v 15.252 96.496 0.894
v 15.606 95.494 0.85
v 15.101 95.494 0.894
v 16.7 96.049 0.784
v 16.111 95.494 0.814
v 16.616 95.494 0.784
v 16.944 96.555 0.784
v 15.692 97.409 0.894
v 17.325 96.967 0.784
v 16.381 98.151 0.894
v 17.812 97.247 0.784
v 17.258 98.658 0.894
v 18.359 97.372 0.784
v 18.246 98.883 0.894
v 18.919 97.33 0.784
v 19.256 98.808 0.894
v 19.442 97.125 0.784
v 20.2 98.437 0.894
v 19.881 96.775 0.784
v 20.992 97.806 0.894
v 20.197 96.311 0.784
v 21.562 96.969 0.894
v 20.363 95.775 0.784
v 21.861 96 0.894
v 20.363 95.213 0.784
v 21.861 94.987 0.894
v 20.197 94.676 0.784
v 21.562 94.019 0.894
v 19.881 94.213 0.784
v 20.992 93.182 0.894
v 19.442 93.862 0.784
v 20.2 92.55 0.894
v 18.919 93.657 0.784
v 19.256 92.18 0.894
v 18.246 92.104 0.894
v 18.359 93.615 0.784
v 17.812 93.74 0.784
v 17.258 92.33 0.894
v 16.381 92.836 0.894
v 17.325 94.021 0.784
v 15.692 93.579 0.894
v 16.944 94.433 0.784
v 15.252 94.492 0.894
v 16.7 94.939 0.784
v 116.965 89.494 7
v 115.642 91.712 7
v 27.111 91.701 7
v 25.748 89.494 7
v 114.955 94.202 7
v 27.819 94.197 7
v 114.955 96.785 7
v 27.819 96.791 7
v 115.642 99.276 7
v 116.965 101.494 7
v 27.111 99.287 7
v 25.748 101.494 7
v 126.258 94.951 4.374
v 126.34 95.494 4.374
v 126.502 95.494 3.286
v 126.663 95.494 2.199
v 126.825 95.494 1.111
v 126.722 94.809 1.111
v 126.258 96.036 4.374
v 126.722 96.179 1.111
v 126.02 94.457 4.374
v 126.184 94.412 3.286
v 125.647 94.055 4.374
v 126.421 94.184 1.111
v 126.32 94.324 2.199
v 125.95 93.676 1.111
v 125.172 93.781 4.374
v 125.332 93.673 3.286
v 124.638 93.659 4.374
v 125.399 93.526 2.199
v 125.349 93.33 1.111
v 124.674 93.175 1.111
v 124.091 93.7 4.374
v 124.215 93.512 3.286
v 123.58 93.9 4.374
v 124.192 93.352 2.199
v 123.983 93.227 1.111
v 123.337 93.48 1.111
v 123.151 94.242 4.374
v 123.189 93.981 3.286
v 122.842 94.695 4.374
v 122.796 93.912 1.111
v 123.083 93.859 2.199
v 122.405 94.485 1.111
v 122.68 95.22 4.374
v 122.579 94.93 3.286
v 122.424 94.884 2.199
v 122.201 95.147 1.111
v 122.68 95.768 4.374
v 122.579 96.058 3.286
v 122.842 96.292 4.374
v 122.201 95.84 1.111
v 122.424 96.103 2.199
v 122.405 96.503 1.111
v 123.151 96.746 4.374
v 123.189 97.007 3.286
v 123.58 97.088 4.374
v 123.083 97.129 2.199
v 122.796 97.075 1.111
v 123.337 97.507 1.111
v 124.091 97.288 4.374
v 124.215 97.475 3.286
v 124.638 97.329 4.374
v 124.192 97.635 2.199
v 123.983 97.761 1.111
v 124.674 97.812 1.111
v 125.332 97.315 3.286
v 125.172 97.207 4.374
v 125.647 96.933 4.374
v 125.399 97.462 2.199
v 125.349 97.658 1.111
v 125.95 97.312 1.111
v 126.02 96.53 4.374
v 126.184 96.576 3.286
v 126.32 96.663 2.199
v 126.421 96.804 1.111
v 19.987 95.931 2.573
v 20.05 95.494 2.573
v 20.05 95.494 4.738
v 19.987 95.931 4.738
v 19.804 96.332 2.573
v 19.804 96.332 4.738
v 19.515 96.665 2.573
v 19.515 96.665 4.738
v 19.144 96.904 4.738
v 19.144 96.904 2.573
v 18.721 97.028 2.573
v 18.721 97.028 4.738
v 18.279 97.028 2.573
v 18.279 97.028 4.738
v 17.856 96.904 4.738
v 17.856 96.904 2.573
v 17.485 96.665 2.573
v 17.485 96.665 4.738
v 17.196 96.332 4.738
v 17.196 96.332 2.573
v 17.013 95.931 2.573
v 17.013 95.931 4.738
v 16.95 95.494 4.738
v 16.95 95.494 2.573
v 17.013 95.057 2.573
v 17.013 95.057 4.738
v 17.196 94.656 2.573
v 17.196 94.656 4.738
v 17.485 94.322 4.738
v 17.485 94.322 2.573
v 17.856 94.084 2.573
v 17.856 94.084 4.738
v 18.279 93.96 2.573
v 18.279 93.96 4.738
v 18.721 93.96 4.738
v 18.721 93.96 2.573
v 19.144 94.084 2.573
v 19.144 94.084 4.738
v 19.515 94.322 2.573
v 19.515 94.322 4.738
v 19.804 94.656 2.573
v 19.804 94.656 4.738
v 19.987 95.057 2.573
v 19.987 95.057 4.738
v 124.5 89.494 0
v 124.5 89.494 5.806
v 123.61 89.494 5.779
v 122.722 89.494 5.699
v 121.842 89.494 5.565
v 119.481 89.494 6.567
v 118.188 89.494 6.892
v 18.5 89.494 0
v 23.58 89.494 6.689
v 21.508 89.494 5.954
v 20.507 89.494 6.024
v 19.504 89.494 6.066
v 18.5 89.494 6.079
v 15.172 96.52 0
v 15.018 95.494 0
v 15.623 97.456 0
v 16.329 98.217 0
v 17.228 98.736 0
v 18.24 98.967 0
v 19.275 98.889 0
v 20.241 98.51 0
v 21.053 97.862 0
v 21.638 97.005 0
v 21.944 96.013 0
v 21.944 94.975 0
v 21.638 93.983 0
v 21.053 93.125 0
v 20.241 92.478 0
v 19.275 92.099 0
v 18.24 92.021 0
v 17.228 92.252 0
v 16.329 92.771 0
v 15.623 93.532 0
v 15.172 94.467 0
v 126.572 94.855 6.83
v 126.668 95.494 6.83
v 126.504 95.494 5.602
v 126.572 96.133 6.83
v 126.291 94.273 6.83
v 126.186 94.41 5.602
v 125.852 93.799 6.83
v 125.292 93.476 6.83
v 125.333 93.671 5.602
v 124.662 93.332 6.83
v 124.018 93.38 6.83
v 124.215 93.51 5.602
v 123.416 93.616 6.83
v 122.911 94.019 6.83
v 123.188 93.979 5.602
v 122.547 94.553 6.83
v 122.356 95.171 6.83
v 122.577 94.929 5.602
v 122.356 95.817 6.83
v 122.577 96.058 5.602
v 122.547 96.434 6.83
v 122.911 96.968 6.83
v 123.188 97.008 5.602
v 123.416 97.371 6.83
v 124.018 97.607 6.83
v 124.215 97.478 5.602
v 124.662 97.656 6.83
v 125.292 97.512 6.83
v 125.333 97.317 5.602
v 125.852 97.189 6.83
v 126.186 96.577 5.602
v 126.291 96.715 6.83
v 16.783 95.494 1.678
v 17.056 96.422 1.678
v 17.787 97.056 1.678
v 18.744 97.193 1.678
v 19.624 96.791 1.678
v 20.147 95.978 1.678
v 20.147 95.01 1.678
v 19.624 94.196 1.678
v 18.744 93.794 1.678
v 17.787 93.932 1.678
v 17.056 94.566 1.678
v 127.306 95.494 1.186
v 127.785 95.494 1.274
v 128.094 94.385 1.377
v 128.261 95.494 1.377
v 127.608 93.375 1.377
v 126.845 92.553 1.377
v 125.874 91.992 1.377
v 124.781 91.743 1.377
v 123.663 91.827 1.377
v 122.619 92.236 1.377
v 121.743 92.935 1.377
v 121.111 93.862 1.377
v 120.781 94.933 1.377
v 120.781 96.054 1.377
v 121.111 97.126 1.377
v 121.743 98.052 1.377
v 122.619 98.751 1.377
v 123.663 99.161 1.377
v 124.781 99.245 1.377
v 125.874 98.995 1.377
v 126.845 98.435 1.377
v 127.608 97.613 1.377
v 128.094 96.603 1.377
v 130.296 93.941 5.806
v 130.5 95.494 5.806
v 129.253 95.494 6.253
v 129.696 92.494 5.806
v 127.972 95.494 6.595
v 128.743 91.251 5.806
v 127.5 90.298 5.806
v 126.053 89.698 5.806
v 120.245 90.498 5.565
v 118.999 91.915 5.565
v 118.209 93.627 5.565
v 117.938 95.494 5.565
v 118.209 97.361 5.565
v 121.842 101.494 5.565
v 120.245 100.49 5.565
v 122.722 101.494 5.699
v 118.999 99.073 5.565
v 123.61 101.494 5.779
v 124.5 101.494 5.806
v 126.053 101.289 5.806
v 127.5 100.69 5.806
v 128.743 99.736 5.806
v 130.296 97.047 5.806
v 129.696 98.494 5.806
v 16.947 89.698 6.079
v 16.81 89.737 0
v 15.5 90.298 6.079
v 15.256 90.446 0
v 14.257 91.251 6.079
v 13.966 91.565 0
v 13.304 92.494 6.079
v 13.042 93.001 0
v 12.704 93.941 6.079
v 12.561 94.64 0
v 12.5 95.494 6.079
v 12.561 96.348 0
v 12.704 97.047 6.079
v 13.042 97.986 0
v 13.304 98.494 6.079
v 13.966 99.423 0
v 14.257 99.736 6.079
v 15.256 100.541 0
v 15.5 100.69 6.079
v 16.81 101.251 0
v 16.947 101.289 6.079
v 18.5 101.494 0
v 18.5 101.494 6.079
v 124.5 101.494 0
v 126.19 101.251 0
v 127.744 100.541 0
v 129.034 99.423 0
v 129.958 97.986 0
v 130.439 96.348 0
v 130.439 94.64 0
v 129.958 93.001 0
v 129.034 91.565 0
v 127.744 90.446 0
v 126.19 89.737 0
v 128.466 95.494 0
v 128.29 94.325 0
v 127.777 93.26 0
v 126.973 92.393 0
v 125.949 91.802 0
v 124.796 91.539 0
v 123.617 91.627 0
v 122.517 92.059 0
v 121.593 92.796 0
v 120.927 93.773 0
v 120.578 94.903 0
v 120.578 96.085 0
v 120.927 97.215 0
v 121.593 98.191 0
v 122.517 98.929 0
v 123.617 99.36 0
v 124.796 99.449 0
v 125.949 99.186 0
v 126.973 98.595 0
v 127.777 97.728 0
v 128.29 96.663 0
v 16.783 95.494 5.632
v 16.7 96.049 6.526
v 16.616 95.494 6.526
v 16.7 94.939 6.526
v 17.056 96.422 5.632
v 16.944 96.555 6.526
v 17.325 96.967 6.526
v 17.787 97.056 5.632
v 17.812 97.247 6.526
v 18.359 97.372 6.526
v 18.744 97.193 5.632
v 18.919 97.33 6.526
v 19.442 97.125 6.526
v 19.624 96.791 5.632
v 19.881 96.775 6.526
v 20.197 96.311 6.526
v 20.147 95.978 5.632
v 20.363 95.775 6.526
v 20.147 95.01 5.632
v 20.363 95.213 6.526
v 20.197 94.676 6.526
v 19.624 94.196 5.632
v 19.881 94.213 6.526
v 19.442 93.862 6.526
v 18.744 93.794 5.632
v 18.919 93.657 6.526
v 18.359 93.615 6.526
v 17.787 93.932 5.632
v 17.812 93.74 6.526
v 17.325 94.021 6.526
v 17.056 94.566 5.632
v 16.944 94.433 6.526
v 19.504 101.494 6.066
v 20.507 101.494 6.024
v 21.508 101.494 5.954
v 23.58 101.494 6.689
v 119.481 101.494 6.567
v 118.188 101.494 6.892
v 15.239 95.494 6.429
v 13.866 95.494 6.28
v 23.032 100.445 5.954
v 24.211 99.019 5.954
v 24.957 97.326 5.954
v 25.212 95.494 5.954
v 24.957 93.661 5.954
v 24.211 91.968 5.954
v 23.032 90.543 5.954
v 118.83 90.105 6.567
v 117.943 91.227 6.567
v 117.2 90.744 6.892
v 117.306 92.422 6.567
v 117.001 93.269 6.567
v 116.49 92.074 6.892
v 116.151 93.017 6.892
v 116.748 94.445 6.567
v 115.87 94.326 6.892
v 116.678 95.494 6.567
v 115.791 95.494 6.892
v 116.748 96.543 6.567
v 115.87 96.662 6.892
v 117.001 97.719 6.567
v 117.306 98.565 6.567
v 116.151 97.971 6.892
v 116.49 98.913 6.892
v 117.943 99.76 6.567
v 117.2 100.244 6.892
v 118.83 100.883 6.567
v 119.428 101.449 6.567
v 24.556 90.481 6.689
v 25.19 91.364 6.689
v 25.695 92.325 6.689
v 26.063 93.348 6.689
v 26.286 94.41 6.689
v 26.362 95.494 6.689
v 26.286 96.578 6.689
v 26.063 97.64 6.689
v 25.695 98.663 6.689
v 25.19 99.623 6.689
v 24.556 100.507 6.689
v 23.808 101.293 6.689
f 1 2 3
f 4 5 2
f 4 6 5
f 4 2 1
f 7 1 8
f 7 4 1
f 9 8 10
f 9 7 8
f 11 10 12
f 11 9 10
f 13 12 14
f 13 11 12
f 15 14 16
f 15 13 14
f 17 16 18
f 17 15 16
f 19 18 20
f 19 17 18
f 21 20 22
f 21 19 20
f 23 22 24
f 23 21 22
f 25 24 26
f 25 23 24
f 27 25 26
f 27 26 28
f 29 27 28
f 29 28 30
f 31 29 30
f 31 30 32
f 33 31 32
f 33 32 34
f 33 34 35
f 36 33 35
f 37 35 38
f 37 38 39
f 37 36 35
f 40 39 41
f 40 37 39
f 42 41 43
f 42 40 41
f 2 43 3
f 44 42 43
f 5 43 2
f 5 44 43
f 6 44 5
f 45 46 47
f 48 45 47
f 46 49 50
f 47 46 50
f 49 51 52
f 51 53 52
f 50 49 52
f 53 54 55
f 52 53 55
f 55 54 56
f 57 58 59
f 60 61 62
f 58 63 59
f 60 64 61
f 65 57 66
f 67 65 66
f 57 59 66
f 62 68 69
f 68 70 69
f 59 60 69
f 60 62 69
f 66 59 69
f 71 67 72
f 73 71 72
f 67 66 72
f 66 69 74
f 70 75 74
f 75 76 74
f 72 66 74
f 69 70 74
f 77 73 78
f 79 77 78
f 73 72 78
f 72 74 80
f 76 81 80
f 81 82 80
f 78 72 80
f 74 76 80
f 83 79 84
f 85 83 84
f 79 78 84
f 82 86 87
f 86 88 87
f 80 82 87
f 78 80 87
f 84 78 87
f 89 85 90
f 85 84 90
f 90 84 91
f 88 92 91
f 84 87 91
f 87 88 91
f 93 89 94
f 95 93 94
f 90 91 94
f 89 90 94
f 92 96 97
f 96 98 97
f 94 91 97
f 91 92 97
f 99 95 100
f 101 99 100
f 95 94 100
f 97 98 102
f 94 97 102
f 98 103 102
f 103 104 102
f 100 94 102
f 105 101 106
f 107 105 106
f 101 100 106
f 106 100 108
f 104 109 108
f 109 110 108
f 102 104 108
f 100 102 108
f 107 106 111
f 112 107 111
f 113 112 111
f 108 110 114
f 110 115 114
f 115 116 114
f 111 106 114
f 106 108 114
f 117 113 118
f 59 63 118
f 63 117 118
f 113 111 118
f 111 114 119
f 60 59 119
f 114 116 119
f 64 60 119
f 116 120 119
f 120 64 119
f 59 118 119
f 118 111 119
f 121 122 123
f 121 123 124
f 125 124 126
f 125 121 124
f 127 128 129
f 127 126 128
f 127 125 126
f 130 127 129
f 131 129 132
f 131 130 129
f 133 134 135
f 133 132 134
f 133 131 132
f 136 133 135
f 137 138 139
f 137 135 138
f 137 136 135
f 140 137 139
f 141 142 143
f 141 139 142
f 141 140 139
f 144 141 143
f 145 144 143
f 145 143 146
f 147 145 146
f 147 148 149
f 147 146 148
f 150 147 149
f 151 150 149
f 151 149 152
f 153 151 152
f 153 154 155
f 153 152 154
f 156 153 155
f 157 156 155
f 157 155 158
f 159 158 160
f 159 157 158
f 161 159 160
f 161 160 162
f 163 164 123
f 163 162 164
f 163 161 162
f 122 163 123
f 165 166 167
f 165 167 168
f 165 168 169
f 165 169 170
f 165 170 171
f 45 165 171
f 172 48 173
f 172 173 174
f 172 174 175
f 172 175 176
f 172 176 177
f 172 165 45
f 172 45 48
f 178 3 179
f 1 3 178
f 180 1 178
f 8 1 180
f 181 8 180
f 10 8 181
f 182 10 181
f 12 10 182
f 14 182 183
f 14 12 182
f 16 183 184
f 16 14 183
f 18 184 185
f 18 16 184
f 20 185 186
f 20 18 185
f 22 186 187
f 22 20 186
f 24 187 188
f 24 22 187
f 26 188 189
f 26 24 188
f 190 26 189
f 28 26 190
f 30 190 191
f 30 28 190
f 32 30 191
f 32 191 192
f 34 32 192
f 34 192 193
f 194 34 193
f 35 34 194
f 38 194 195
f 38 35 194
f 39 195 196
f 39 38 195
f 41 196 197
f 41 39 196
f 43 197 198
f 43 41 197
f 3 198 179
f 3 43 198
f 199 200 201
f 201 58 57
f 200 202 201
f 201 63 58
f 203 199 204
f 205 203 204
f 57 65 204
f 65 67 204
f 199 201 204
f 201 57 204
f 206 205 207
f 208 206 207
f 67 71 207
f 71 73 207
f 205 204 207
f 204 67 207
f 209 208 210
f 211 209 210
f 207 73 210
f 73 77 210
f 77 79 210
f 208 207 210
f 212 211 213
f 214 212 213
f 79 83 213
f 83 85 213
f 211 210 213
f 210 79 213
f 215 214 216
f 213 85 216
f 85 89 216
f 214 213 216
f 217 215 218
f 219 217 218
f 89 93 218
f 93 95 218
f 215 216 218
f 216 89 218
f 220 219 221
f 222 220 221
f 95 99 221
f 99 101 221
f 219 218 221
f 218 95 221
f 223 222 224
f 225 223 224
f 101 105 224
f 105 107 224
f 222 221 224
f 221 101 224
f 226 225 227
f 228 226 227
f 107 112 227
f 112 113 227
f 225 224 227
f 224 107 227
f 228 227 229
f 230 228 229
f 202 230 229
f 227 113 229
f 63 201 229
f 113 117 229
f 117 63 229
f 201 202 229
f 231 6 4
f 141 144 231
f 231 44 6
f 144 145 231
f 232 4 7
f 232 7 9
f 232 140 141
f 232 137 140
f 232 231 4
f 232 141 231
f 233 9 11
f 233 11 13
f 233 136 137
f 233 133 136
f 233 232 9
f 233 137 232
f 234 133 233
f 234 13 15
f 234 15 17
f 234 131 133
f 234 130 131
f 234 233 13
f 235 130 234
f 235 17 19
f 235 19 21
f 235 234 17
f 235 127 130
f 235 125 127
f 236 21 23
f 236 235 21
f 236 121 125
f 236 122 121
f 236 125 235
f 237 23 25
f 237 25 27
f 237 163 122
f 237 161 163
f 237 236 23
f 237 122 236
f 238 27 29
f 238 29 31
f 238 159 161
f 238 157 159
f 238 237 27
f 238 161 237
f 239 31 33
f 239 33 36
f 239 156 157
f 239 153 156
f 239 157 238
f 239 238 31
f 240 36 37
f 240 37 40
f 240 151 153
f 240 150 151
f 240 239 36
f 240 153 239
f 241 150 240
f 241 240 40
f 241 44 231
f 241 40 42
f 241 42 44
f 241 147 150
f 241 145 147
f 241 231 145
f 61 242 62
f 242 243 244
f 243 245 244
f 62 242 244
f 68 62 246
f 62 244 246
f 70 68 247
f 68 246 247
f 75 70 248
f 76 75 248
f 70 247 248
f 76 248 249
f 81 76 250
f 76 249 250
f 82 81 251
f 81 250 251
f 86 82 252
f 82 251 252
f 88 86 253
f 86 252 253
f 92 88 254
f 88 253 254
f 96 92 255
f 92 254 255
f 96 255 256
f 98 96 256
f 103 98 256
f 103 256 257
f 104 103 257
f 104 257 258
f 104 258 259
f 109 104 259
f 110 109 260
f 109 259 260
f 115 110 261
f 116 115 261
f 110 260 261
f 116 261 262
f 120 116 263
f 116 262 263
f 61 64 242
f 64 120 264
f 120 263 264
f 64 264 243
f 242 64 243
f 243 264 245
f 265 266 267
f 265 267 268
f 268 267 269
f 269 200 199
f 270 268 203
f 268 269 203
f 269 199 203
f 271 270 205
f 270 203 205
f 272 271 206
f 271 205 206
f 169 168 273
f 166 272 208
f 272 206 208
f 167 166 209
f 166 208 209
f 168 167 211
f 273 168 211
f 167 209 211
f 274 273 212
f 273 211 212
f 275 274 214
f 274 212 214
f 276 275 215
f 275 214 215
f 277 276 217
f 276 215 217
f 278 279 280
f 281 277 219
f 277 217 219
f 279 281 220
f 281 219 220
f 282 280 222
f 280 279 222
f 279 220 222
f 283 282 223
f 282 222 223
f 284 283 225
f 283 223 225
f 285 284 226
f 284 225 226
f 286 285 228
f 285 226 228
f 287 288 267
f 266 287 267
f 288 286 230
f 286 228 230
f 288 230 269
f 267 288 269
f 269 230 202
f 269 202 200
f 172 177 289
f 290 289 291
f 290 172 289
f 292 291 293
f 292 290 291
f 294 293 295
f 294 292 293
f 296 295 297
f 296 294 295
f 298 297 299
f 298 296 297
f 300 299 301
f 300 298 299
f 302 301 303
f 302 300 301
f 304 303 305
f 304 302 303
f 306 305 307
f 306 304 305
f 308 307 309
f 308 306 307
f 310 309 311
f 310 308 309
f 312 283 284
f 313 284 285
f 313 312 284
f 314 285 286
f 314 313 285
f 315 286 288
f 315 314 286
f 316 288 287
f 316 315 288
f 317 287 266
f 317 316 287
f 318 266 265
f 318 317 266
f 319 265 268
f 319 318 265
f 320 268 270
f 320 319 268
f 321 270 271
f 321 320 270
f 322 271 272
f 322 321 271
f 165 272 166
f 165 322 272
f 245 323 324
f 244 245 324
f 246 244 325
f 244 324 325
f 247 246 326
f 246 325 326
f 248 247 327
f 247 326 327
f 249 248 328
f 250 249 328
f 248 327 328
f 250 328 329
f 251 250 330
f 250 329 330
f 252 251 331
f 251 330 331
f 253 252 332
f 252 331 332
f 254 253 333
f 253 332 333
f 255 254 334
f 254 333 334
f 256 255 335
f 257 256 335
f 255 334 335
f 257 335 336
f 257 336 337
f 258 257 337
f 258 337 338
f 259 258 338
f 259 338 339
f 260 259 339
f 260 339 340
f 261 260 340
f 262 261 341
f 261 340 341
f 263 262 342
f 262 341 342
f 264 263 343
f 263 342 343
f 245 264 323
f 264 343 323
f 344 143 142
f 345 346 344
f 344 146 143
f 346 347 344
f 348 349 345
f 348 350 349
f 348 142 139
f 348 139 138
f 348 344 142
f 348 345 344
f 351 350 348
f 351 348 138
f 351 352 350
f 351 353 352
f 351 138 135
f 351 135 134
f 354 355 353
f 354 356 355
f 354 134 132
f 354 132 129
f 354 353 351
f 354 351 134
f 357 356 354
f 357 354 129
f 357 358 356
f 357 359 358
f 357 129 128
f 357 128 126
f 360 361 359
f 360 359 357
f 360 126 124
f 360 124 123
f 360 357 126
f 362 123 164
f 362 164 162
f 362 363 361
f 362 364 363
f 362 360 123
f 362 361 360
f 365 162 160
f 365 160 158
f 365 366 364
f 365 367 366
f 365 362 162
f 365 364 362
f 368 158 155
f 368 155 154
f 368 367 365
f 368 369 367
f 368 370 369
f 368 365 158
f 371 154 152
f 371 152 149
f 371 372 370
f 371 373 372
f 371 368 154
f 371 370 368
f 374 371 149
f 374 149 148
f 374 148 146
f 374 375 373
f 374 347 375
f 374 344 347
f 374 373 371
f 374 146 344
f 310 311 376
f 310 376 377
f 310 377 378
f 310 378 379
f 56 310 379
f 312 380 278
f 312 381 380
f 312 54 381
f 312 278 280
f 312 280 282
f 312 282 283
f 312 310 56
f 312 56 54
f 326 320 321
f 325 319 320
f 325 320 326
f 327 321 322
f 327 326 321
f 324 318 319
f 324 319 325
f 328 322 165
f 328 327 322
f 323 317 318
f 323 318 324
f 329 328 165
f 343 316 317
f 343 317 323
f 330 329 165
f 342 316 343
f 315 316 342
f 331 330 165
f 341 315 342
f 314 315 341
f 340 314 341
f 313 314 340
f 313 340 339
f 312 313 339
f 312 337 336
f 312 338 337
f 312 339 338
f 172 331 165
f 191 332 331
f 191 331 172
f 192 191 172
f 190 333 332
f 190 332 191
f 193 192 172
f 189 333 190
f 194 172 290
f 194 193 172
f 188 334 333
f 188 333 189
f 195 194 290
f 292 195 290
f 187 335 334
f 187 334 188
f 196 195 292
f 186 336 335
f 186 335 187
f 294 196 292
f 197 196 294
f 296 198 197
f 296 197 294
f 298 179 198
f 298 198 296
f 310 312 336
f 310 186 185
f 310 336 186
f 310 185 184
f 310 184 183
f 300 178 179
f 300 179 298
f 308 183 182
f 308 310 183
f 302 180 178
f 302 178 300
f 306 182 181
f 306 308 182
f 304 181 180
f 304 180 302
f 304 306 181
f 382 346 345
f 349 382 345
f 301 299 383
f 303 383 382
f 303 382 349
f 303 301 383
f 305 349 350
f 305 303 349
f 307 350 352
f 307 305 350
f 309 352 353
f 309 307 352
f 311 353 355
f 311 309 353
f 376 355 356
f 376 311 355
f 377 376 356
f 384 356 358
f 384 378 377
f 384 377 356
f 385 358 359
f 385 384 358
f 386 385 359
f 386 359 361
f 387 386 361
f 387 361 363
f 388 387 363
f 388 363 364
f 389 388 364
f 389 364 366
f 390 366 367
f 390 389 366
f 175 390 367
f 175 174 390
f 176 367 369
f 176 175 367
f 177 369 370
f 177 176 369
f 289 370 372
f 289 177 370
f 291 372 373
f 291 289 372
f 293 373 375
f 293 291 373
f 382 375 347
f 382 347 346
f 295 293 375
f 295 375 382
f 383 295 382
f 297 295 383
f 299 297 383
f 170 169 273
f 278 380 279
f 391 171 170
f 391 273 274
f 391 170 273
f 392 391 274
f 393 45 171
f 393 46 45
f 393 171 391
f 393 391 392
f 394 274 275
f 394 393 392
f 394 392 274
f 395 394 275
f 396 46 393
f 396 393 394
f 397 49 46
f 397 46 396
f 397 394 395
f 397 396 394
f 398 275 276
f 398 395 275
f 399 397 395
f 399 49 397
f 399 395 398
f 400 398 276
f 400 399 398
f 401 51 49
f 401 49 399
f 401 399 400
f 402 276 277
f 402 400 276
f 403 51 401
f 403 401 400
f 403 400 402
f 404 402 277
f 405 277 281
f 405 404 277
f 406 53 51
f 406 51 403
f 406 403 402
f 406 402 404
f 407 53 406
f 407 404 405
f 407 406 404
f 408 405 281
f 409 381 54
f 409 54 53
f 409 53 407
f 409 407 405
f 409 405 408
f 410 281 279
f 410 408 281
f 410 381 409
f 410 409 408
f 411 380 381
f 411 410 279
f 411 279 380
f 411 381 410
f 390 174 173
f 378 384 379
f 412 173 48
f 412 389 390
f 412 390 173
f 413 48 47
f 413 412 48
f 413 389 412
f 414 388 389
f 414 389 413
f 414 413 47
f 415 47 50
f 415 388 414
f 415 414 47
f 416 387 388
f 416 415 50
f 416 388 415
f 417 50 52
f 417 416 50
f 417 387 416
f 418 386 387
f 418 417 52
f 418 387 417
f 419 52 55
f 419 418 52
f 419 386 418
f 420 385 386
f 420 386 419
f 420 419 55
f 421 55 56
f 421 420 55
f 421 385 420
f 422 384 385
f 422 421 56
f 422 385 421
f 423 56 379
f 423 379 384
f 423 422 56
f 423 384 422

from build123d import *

# Parameters (mm, degrees)
SKETCH_1_R      = 1.55
EXTRUDE_1_DEPTH = 7
FILLET_1_R      = 4


with BuildPart() as part:
    # Эскиз1 → Бобышка-Вытянуть1 (new body)
    with BuildSketch(Plane.XY):
        with BuildLine():
            Line((18.5, 101.493831222), (124.5, 101.493831222))
            ThreePointArc((124.5, 101.493831222), (130.5, 95.493831222), (124.5, 89.493831222))
            Line((124.5, 89.493831222), (18.5, 89.493831222))
            ThreePointArc((18.5, 89.493831222), (12.5, 95.493831222), (18.5, 101.493831222))
        make_face()
        with Locations((124.5, 95.493831222)):
            Circle(SKETCH_1_R, mode=Mode.SUBTRACT)
        with Locations((18.5, 95.493831222)):
            Circle(SKETCH_1_R, mode=Mode.SUBTRACT)
    extrude(amount=EXTRUDE_1_DEPTH)

    # Эскиз3 → Вырез-Повернуть1 (revolve, cut)
    with BuildSketch(Plane(origin=(0, 95.493831222, 0), x_dir=(1, 0, 0), z_dir=(0, 1, 0))):
        with BuildLine():
            Line((11.788259636, -5.953922017), (11.5, -7.498579905))
            Line((11.5, -7.498579905), (18.5, -7.498579905))
            Line((18.5, -7.498579905), (18.5, -3.65512576))
            Line((18.5, -3.65512576), (18.5, 0.188328385))
            Line((18.5, 0.188328385), (15, 0.188328385))
            Line((15, 0.188328385), (15.100959011, -0.893662386))
            ThreePointArc((15.100959011, -0.893662386), (15.858000965, -0.830944257), (16.616181879, -0.783957185))
            Line((16.616181879, -0.783957185), (17.151991145, -3.65512576))
            Line((17.151991145, -3.65512576), (16.616181879, -6.526294335))
            ThreePointArc((16.616181879, -6.526294335), (14.192702827, -6.320391282), (11.788259636, -5.953922017))
        make_face()
    revolve(axis=Axis((18.5, 95.493831222, 14.092750712), (0, 0, -1)), mode=Mode.SUBTRACT)

    # Эскиз4 → Вырез-Повернуть2 (revolve, cut)
    with BuildSketch(Plane(origin=(0, 95.493831222, 0), x_dir=(1, 0, 0), z_dir=(0, 1, 0))):
        with BuildLine():
            Line((124.5, -6.829517276), (124.5, -8.843780512))
            Line((124.5, -8.843780512), (131.5, -8.843780512))
            Line((131.5, -8.843780512), (131.062493989, -5.564992503))
            ThreePointArc((131.062493989, -5.564992503), (128.910766156, -6.355557055), (126.667936093, -6.829517276))
            Line((126.667936093, -6.829517276), (126.340236608, -4.373648978))
            Line((126.340236608, -4.373648978), (126.825045666, -1.111490634))
            ThreePointArc((126.825045666, -1.111490634), (127.546113951, -1.228496574), (128.261402877, -1.37679228))
            Line((128.261402877, -1.37679228), (128.620585304, 1.040056032))
            Line((128.620585304, 1.040056032), (124.5, 1.040056032))
            Line((124.5, 1.040056032), (124.5, -0.95889034))
            Line((124.5, -0.95889034), (124.5, -4.373648978))
            Line((124.5, -4.373648978), (124.5, -6.829517276))
        make_face()
    revolve(axis=Axis((124.5, 95.493831222, 6.829517276), (0, 0, -1)), mode=Mode.SUBTRACT)

    # Скругление1
    # the kernel refuses this fillet: 4 mm, written as the material it takes off along each edge
    with BuildSketch(Plane(origin=(18.5, 95.493831222, 7), x_dir=(-0.3783138091133085, -0.9256774070021258, 0), z_dir=(-0.9256774070021258, 0.3783138091133085, 0))) as fillet_1_piece_1:
        with BuildLine():
            CenterArc((9.408839679, -4), FILLET_1_R, 90, 42.397861789)
            Line((6.711740364, -1.046077983), (6.657798378, -0.986999543))
            ThreePointArc((6.657798378, -0.986999543), (6.730706082, -0.508362986), (6.828314122, 0.014676005))
            Line((6.828314122, 0.014676005), (6.906956445, 0.08))
            Line((6.906956445, 0.08), (9.408839679, 0.08))
            Line((9.408839679, 0.08), (9.408839679, 0))
        make_face()
    revolve(axis=Axis((18.5, 95.493831222, 7), (0, 0, 1)), revolution_arc=224.458550317, mode=Mode.SUBTRACT)
    with BuildSketch(Plane(origin=(124.5, 95.493831222, 7), x_dir=(0.5555728913657687, -0.8314678360462777, 0), z_dir=(0.8314678360462777, 0.5555728913657687, 0))) as fillet_1_piece_2:
        with BuildLine():
            CenterArc((9.631828356, 4), FILLET_1_R, 219.884952178, 50.115047822)
            Line((9.631828356, 0), (9.631828356, -0.08))
            Line((9.631828356, -0.08), (6.753974623, -0.08))
            Line((6.753974623, -0.08), (6.67467745, -0.010581041))
            ThreePointArc((6.67467745, -0.010581041), (6.578937133, 0.706922708), (6.501107302, 1.383707647))
            Line((6.501107302, 1.383707647), (6.562493989, 1.435007497))
        make_face()
    revolve(axis=Axis((124.5, 95.493831222, 7), (0, 0, -1)), revolution_arc=247.500366369, mode=Mode.SUBTRACT)


solid = part.part
